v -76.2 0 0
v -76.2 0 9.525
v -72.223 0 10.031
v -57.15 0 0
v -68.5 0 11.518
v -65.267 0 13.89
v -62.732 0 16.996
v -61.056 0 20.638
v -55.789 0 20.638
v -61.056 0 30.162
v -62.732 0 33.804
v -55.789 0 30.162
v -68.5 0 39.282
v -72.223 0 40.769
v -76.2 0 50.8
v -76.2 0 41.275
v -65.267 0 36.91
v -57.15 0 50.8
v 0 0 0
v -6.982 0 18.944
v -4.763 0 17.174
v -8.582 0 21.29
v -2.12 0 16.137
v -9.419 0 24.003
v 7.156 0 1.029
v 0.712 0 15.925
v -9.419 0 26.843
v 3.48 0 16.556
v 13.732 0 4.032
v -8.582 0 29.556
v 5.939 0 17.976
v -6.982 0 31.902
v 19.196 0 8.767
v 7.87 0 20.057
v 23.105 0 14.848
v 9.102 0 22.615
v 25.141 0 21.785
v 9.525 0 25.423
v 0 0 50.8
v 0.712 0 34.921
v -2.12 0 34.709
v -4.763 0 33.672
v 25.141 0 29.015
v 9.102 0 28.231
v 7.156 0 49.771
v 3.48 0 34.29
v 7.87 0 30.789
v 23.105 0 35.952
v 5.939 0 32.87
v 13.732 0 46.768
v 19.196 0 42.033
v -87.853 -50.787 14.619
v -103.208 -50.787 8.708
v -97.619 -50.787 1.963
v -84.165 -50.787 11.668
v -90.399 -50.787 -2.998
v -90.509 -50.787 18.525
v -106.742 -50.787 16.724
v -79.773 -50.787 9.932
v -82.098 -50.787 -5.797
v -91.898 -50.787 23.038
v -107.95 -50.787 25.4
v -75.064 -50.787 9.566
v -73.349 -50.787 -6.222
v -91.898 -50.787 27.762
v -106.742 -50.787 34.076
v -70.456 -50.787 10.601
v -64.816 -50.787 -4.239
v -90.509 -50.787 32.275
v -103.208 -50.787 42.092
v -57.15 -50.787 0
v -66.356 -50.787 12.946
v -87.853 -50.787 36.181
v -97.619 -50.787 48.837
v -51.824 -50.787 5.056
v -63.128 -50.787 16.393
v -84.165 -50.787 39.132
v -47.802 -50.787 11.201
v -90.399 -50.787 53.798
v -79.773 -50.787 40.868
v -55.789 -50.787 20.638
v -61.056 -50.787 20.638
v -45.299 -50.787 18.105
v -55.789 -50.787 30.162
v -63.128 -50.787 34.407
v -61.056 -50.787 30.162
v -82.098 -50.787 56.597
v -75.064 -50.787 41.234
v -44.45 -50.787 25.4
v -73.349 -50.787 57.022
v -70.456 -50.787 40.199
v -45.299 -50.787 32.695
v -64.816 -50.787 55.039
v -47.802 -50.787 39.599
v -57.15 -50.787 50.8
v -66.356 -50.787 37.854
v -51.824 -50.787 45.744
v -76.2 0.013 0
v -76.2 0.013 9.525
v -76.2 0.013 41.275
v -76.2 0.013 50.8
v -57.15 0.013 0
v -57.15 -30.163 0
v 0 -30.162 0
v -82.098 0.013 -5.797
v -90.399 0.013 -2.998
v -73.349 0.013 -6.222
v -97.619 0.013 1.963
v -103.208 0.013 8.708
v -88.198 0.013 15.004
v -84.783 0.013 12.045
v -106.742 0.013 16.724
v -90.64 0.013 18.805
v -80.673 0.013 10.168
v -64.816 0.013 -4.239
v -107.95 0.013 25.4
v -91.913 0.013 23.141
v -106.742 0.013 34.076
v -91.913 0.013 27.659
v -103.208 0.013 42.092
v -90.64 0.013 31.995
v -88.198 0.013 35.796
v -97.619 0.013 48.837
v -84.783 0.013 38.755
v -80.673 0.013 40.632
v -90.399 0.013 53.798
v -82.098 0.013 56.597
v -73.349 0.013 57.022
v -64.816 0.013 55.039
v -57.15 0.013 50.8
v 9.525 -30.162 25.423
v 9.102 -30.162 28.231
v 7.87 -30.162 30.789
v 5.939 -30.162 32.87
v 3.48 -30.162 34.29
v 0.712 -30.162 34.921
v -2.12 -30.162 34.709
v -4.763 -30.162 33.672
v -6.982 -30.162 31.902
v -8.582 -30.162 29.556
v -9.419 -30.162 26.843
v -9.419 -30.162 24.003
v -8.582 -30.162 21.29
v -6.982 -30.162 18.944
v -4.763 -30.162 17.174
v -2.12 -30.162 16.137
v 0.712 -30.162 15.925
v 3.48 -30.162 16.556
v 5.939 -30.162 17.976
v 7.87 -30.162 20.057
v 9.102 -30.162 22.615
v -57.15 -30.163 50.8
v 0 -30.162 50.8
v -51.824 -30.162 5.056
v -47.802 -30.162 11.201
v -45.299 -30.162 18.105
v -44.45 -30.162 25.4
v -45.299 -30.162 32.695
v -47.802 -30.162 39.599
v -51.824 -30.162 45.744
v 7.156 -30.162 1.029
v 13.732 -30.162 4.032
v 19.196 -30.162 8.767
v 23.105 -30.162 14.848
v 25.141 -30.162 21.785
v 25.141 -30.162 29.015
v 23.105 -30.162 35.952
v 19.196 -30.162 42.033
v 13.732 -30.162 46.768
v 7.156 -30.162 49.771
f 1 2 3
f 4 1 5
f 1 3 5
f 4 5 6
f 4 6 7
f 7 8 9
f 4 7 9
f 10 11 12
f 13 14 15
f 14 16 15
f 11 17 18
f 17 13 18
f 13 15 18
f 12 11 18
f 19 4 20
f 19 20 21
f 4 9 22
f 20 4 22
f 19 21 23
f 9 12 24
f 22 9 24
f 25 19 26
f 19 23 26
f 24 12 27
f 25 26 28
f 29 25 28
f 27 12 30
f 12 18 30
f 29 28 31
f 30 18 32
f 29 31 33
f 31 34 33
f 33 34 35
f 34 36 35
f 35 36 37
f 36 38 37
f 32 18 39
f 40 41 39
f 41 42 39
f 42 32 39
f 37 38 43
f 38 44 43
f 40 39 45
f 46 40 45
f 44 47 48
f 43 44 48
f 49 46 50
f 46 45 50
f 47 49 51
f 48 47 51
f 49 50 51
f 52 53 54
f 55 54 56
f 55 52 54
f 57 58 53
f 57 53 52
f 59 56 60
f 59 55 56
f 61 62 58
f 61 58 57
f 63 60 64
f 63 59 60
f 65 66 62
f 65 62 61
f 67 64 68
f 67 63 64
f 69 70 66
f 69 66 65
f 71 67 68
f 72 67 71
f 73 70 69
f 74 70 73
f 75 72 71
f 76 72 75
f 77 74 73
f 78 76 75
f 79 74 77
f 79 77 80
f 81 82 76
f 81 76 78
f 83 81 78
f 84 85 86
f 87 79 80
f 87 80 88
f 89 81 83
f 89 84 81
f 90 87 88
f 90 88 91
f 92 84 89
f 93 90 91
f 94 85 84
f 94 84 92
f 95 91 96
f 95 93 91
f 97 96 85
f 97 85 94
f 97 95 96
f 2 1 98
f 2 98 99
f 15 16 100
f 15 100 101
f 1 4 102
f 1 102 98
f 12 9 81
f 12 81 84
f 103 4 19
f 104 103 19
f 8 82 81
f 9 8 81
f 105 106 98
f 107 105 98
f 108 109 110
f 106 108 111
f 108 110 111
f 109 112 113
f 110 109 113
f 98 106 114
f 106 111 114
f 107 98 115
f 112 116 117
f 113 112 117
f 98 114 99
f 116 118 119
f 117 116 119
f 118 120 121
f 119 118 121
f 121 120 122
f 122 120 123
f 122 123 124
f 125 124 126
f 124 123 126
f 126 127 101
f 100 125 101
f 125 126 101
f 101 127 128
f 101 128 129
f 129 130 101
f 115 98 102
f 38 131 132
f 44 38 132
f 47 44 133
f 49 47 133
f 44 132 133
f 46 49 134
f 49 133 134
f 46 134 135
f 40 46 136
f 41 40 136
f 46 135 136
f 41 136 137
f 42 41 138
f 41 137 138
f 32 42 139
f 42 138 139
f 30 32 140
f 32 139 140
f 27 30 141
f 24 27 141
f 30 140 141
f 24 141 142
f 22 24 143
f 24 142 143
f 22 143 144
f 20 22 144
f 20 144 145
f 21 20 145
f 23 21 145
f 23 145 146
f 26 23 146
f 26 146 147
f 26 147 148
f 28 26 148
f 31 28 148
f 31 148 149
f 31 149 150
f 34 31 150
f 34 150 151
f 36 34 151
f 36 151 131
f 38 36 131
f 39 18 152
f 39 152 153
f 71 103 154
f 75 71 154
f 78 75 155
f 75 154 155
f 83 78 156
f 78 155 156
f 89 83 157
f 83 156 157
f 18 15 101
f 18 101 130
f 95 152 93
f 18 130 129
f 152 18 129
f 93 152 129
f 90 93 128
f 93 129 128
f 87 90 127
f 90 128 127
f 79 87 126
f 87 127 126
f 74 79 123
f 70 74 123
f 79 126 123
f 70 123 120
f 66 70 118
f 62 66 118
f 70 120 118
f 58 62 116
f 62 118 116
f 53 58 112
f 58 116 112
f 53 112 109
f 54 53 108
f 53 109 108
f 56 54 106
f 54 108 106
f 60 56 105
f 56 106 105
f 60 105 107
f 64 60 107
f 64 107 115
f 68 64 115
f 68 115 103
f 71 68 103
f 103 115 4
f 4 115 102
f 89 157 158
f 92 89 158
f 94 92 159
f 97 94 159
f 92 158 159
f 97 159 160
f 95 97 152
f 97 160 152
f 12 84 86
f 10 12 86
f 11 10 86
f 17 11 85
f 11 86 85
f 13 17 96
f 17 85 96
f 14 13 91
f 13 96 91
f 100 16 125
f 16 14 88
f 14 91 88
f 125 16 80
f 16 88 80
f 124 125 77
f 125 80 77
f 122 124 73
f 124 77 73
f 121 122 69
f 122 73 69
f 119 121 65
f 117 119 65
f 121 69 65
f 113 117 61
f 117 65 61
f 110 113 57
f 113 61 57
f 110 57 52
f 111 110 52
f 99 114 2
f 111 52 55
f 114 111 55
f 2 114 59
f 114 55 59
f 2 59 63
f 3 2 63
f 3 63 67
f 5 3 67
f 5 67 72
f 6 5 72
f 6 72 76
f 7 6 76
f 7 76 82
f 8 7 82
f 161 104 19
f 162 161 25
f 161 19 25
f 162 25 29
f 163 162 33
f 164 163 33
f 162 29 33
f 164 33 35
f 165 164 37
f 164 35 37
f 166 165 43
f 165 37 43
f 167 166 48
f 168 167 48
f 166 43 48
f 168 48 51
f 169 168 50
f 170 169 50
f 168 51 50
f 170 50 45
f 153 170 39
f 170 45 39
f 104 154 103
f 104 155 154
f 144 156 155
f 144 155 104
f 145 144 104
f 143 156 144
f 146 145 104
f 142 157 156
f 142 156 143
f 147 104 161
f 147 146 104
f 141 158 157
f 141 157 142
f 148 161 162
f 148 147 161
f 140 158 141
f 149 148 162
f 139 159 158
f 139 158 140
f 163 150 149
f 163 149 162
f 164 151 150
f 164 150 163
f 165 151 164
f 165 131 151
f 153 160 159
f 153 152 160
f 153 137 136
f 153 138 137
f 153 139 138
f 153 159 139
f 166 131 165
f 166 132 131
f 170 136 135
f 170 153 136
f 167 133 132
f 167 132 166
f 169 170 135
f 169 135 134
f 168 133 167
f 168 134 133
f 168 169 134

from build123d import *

# Parameters (mm, degrees)
F0_W     = 76.2
F0_H     = 50.8
F1_DEPTH = 30.1625
F3_DEPTH = 30.1752
F4_DEPTH = 20.6248
F5_DEPTH = 20.6248
F7_DEPTH = 50.8
F8_R     = 9.525
F9_DEPTH = 30.1752


with BuildPart() as f1:
    # F0 (on Front) → F1 (new body)
    with BuildSketch(Plane.XZ):
        with Locations((-38.1, 25.4)):
            Rectangle(F0_W, F0_H)
        with BuildLine():
            Line((0, 50.8), (0, 0))
            ThreePointArc((0, 0), (25.4, 25.4), (0, 50.8))
        make_face()
    extrude(amount=F1_DEPTH)

    # F2 (on face) → F3 (join)
    with BuildSketch(Plane.XZ.offset(30.1625)):
        with BuildLine():
            Line((-76.2, 50.8), (-57.15, 50.8))
            ThreePointArc((-57.15, 50.8), (-107.95, 25.4), (-57.15, 0))
            Line((-57.15, 0), (-76.2, 0))
            Line((-76.2, 0), (-76.2, 50.8))
        make_face()
    extrude(amount=-F3_DEPTH)

    # F2 (on face) → F4 (join)
    with BuildSketch(Plane.XZ.offset(30.1625)):
        with BuildLine():
            Line((-76.2, 50.8), (-57.15, 50.8))
            ThreePointArc((-57.15, 50.8), (-107.95, 25.4), (-57.15, 0))
            Line((-57.15, 0), (-76.2, 0))
            Line((-76.2, 0), (-76.2, 50.8))
        make_face()
    extrude(amount=F4_DEPTH)

    # F2 (on face) → F5 (join)
    with BuildSketch(Plane.XZ.offset(30.1625)):
        with BuildLine():
            ThreePointArc((-57.15, 0), (-47.8019366858, 11.2009683429), (-44.45, 25.4))
            ThreePointArc((-44.45, 25.4), (-47.8019366858, 39.5990316571), (-57.15, 50.8))
            Line((-57.15, 50.8), (-76.2, 50.8))
            Line((-76.2, 50.8), (-76.2, 0))
            Line((-76.2, 0), (-57.15, 0))
        make_face()
        with BuildLine():
            Line((-76.2, 50.8), (-57.15, 50.8))
            ThreePointArc((-57.15, 50.8), (-107.95, 25.4), (-57.15, 0))
            Line((-57.15, 0), (-76.2, 0))
            Line((-76.2, 0), (-76.2, 50.8))
        make_face()
    extrude(amount=F5_DEPTH)

    # F6 (on face) → F7 (cut)
    with BuildSketch(Plane.XZ.offset(50.7873)):
        with BuildLine():
            Line((-76.2, 25.4), (-60.325, 25.4))
            ThreePointArc((-60.325, 25.4), (-60.5088686027, 27.8091534761), (-61.0562151775, 30.1625))
            ThreePointArc((-61.0562151775, 30.1625), (-66.8082233443, 38.1988341754), (-76.2, 41.275))
            Line((-76.2, 41.275), (-76.2, 25.4))
        make_face()
        with BuildLine():
            Line((-55.7891130447, 25.4), (-60.325, 25.4))
            ThreePointArc((-60.325, 25.4), (-60.5088686027, 22.9908465239), (-61.0562151775, 20.6375))
            Line((-61.0562151775, 20.6375), (-55.7891130447, 20.6375))
            Line((-55.7891130447, 20.6375), (-55.7891130447, 25.4))
        make_face()
        with BuildLine():
            ThreePointArc((-61.0562151775, 20.6375), (-60.5088686027, 22.9908465239), (-60.325, 25.4))
            Line((-60.325, 25.4), (-76.2, 25.4))
            Line((-76.2, 25.4), (-76.2, 9.525))
            ThreePointArc((-76.2, 9.525), (-66.8082233443, 12.6011658246), (-61.0562151775, 20.6375))
        make_face()
        with BuildLine():
            ThreePointArc((-61.0562151775, 30.1625), (-60.5088686027, 27.8091534761), (-60.325, 25.4))
            Line((-60.325, 25.4), (-55.7891130447, 25.4))
            Line((-55.7891130447, 25.4), (-55.7891130447, 30.1625))
            Line((-55.7891130447, 30.1625), (-61.0562151775, 30.1625))
        make_face()
        with BuildLine():
            Line((-76.2, 9.525), (-76.2, 25.4))
            Line((-76.2, 25.4), (-76.2, 41.275))
            ThreePointArc((-76.2, 41.275), (-92.075, 25.4), (-76.2, 9.525))
        make_face()
    extrude(amount=-F7_DEPTH, mode=Mode.SUBTRACT)

    # F8 (on face) → F9 (cut)
    with BuildSketch(Plane.XZ.offset(30.1625)):
        with Locations((0, 25.4230257124)):
            Circle(F8_R)
    extrude(amount=-F9_DEPTH, mode=Mode.SUBTRACT)


solid = f1.part
